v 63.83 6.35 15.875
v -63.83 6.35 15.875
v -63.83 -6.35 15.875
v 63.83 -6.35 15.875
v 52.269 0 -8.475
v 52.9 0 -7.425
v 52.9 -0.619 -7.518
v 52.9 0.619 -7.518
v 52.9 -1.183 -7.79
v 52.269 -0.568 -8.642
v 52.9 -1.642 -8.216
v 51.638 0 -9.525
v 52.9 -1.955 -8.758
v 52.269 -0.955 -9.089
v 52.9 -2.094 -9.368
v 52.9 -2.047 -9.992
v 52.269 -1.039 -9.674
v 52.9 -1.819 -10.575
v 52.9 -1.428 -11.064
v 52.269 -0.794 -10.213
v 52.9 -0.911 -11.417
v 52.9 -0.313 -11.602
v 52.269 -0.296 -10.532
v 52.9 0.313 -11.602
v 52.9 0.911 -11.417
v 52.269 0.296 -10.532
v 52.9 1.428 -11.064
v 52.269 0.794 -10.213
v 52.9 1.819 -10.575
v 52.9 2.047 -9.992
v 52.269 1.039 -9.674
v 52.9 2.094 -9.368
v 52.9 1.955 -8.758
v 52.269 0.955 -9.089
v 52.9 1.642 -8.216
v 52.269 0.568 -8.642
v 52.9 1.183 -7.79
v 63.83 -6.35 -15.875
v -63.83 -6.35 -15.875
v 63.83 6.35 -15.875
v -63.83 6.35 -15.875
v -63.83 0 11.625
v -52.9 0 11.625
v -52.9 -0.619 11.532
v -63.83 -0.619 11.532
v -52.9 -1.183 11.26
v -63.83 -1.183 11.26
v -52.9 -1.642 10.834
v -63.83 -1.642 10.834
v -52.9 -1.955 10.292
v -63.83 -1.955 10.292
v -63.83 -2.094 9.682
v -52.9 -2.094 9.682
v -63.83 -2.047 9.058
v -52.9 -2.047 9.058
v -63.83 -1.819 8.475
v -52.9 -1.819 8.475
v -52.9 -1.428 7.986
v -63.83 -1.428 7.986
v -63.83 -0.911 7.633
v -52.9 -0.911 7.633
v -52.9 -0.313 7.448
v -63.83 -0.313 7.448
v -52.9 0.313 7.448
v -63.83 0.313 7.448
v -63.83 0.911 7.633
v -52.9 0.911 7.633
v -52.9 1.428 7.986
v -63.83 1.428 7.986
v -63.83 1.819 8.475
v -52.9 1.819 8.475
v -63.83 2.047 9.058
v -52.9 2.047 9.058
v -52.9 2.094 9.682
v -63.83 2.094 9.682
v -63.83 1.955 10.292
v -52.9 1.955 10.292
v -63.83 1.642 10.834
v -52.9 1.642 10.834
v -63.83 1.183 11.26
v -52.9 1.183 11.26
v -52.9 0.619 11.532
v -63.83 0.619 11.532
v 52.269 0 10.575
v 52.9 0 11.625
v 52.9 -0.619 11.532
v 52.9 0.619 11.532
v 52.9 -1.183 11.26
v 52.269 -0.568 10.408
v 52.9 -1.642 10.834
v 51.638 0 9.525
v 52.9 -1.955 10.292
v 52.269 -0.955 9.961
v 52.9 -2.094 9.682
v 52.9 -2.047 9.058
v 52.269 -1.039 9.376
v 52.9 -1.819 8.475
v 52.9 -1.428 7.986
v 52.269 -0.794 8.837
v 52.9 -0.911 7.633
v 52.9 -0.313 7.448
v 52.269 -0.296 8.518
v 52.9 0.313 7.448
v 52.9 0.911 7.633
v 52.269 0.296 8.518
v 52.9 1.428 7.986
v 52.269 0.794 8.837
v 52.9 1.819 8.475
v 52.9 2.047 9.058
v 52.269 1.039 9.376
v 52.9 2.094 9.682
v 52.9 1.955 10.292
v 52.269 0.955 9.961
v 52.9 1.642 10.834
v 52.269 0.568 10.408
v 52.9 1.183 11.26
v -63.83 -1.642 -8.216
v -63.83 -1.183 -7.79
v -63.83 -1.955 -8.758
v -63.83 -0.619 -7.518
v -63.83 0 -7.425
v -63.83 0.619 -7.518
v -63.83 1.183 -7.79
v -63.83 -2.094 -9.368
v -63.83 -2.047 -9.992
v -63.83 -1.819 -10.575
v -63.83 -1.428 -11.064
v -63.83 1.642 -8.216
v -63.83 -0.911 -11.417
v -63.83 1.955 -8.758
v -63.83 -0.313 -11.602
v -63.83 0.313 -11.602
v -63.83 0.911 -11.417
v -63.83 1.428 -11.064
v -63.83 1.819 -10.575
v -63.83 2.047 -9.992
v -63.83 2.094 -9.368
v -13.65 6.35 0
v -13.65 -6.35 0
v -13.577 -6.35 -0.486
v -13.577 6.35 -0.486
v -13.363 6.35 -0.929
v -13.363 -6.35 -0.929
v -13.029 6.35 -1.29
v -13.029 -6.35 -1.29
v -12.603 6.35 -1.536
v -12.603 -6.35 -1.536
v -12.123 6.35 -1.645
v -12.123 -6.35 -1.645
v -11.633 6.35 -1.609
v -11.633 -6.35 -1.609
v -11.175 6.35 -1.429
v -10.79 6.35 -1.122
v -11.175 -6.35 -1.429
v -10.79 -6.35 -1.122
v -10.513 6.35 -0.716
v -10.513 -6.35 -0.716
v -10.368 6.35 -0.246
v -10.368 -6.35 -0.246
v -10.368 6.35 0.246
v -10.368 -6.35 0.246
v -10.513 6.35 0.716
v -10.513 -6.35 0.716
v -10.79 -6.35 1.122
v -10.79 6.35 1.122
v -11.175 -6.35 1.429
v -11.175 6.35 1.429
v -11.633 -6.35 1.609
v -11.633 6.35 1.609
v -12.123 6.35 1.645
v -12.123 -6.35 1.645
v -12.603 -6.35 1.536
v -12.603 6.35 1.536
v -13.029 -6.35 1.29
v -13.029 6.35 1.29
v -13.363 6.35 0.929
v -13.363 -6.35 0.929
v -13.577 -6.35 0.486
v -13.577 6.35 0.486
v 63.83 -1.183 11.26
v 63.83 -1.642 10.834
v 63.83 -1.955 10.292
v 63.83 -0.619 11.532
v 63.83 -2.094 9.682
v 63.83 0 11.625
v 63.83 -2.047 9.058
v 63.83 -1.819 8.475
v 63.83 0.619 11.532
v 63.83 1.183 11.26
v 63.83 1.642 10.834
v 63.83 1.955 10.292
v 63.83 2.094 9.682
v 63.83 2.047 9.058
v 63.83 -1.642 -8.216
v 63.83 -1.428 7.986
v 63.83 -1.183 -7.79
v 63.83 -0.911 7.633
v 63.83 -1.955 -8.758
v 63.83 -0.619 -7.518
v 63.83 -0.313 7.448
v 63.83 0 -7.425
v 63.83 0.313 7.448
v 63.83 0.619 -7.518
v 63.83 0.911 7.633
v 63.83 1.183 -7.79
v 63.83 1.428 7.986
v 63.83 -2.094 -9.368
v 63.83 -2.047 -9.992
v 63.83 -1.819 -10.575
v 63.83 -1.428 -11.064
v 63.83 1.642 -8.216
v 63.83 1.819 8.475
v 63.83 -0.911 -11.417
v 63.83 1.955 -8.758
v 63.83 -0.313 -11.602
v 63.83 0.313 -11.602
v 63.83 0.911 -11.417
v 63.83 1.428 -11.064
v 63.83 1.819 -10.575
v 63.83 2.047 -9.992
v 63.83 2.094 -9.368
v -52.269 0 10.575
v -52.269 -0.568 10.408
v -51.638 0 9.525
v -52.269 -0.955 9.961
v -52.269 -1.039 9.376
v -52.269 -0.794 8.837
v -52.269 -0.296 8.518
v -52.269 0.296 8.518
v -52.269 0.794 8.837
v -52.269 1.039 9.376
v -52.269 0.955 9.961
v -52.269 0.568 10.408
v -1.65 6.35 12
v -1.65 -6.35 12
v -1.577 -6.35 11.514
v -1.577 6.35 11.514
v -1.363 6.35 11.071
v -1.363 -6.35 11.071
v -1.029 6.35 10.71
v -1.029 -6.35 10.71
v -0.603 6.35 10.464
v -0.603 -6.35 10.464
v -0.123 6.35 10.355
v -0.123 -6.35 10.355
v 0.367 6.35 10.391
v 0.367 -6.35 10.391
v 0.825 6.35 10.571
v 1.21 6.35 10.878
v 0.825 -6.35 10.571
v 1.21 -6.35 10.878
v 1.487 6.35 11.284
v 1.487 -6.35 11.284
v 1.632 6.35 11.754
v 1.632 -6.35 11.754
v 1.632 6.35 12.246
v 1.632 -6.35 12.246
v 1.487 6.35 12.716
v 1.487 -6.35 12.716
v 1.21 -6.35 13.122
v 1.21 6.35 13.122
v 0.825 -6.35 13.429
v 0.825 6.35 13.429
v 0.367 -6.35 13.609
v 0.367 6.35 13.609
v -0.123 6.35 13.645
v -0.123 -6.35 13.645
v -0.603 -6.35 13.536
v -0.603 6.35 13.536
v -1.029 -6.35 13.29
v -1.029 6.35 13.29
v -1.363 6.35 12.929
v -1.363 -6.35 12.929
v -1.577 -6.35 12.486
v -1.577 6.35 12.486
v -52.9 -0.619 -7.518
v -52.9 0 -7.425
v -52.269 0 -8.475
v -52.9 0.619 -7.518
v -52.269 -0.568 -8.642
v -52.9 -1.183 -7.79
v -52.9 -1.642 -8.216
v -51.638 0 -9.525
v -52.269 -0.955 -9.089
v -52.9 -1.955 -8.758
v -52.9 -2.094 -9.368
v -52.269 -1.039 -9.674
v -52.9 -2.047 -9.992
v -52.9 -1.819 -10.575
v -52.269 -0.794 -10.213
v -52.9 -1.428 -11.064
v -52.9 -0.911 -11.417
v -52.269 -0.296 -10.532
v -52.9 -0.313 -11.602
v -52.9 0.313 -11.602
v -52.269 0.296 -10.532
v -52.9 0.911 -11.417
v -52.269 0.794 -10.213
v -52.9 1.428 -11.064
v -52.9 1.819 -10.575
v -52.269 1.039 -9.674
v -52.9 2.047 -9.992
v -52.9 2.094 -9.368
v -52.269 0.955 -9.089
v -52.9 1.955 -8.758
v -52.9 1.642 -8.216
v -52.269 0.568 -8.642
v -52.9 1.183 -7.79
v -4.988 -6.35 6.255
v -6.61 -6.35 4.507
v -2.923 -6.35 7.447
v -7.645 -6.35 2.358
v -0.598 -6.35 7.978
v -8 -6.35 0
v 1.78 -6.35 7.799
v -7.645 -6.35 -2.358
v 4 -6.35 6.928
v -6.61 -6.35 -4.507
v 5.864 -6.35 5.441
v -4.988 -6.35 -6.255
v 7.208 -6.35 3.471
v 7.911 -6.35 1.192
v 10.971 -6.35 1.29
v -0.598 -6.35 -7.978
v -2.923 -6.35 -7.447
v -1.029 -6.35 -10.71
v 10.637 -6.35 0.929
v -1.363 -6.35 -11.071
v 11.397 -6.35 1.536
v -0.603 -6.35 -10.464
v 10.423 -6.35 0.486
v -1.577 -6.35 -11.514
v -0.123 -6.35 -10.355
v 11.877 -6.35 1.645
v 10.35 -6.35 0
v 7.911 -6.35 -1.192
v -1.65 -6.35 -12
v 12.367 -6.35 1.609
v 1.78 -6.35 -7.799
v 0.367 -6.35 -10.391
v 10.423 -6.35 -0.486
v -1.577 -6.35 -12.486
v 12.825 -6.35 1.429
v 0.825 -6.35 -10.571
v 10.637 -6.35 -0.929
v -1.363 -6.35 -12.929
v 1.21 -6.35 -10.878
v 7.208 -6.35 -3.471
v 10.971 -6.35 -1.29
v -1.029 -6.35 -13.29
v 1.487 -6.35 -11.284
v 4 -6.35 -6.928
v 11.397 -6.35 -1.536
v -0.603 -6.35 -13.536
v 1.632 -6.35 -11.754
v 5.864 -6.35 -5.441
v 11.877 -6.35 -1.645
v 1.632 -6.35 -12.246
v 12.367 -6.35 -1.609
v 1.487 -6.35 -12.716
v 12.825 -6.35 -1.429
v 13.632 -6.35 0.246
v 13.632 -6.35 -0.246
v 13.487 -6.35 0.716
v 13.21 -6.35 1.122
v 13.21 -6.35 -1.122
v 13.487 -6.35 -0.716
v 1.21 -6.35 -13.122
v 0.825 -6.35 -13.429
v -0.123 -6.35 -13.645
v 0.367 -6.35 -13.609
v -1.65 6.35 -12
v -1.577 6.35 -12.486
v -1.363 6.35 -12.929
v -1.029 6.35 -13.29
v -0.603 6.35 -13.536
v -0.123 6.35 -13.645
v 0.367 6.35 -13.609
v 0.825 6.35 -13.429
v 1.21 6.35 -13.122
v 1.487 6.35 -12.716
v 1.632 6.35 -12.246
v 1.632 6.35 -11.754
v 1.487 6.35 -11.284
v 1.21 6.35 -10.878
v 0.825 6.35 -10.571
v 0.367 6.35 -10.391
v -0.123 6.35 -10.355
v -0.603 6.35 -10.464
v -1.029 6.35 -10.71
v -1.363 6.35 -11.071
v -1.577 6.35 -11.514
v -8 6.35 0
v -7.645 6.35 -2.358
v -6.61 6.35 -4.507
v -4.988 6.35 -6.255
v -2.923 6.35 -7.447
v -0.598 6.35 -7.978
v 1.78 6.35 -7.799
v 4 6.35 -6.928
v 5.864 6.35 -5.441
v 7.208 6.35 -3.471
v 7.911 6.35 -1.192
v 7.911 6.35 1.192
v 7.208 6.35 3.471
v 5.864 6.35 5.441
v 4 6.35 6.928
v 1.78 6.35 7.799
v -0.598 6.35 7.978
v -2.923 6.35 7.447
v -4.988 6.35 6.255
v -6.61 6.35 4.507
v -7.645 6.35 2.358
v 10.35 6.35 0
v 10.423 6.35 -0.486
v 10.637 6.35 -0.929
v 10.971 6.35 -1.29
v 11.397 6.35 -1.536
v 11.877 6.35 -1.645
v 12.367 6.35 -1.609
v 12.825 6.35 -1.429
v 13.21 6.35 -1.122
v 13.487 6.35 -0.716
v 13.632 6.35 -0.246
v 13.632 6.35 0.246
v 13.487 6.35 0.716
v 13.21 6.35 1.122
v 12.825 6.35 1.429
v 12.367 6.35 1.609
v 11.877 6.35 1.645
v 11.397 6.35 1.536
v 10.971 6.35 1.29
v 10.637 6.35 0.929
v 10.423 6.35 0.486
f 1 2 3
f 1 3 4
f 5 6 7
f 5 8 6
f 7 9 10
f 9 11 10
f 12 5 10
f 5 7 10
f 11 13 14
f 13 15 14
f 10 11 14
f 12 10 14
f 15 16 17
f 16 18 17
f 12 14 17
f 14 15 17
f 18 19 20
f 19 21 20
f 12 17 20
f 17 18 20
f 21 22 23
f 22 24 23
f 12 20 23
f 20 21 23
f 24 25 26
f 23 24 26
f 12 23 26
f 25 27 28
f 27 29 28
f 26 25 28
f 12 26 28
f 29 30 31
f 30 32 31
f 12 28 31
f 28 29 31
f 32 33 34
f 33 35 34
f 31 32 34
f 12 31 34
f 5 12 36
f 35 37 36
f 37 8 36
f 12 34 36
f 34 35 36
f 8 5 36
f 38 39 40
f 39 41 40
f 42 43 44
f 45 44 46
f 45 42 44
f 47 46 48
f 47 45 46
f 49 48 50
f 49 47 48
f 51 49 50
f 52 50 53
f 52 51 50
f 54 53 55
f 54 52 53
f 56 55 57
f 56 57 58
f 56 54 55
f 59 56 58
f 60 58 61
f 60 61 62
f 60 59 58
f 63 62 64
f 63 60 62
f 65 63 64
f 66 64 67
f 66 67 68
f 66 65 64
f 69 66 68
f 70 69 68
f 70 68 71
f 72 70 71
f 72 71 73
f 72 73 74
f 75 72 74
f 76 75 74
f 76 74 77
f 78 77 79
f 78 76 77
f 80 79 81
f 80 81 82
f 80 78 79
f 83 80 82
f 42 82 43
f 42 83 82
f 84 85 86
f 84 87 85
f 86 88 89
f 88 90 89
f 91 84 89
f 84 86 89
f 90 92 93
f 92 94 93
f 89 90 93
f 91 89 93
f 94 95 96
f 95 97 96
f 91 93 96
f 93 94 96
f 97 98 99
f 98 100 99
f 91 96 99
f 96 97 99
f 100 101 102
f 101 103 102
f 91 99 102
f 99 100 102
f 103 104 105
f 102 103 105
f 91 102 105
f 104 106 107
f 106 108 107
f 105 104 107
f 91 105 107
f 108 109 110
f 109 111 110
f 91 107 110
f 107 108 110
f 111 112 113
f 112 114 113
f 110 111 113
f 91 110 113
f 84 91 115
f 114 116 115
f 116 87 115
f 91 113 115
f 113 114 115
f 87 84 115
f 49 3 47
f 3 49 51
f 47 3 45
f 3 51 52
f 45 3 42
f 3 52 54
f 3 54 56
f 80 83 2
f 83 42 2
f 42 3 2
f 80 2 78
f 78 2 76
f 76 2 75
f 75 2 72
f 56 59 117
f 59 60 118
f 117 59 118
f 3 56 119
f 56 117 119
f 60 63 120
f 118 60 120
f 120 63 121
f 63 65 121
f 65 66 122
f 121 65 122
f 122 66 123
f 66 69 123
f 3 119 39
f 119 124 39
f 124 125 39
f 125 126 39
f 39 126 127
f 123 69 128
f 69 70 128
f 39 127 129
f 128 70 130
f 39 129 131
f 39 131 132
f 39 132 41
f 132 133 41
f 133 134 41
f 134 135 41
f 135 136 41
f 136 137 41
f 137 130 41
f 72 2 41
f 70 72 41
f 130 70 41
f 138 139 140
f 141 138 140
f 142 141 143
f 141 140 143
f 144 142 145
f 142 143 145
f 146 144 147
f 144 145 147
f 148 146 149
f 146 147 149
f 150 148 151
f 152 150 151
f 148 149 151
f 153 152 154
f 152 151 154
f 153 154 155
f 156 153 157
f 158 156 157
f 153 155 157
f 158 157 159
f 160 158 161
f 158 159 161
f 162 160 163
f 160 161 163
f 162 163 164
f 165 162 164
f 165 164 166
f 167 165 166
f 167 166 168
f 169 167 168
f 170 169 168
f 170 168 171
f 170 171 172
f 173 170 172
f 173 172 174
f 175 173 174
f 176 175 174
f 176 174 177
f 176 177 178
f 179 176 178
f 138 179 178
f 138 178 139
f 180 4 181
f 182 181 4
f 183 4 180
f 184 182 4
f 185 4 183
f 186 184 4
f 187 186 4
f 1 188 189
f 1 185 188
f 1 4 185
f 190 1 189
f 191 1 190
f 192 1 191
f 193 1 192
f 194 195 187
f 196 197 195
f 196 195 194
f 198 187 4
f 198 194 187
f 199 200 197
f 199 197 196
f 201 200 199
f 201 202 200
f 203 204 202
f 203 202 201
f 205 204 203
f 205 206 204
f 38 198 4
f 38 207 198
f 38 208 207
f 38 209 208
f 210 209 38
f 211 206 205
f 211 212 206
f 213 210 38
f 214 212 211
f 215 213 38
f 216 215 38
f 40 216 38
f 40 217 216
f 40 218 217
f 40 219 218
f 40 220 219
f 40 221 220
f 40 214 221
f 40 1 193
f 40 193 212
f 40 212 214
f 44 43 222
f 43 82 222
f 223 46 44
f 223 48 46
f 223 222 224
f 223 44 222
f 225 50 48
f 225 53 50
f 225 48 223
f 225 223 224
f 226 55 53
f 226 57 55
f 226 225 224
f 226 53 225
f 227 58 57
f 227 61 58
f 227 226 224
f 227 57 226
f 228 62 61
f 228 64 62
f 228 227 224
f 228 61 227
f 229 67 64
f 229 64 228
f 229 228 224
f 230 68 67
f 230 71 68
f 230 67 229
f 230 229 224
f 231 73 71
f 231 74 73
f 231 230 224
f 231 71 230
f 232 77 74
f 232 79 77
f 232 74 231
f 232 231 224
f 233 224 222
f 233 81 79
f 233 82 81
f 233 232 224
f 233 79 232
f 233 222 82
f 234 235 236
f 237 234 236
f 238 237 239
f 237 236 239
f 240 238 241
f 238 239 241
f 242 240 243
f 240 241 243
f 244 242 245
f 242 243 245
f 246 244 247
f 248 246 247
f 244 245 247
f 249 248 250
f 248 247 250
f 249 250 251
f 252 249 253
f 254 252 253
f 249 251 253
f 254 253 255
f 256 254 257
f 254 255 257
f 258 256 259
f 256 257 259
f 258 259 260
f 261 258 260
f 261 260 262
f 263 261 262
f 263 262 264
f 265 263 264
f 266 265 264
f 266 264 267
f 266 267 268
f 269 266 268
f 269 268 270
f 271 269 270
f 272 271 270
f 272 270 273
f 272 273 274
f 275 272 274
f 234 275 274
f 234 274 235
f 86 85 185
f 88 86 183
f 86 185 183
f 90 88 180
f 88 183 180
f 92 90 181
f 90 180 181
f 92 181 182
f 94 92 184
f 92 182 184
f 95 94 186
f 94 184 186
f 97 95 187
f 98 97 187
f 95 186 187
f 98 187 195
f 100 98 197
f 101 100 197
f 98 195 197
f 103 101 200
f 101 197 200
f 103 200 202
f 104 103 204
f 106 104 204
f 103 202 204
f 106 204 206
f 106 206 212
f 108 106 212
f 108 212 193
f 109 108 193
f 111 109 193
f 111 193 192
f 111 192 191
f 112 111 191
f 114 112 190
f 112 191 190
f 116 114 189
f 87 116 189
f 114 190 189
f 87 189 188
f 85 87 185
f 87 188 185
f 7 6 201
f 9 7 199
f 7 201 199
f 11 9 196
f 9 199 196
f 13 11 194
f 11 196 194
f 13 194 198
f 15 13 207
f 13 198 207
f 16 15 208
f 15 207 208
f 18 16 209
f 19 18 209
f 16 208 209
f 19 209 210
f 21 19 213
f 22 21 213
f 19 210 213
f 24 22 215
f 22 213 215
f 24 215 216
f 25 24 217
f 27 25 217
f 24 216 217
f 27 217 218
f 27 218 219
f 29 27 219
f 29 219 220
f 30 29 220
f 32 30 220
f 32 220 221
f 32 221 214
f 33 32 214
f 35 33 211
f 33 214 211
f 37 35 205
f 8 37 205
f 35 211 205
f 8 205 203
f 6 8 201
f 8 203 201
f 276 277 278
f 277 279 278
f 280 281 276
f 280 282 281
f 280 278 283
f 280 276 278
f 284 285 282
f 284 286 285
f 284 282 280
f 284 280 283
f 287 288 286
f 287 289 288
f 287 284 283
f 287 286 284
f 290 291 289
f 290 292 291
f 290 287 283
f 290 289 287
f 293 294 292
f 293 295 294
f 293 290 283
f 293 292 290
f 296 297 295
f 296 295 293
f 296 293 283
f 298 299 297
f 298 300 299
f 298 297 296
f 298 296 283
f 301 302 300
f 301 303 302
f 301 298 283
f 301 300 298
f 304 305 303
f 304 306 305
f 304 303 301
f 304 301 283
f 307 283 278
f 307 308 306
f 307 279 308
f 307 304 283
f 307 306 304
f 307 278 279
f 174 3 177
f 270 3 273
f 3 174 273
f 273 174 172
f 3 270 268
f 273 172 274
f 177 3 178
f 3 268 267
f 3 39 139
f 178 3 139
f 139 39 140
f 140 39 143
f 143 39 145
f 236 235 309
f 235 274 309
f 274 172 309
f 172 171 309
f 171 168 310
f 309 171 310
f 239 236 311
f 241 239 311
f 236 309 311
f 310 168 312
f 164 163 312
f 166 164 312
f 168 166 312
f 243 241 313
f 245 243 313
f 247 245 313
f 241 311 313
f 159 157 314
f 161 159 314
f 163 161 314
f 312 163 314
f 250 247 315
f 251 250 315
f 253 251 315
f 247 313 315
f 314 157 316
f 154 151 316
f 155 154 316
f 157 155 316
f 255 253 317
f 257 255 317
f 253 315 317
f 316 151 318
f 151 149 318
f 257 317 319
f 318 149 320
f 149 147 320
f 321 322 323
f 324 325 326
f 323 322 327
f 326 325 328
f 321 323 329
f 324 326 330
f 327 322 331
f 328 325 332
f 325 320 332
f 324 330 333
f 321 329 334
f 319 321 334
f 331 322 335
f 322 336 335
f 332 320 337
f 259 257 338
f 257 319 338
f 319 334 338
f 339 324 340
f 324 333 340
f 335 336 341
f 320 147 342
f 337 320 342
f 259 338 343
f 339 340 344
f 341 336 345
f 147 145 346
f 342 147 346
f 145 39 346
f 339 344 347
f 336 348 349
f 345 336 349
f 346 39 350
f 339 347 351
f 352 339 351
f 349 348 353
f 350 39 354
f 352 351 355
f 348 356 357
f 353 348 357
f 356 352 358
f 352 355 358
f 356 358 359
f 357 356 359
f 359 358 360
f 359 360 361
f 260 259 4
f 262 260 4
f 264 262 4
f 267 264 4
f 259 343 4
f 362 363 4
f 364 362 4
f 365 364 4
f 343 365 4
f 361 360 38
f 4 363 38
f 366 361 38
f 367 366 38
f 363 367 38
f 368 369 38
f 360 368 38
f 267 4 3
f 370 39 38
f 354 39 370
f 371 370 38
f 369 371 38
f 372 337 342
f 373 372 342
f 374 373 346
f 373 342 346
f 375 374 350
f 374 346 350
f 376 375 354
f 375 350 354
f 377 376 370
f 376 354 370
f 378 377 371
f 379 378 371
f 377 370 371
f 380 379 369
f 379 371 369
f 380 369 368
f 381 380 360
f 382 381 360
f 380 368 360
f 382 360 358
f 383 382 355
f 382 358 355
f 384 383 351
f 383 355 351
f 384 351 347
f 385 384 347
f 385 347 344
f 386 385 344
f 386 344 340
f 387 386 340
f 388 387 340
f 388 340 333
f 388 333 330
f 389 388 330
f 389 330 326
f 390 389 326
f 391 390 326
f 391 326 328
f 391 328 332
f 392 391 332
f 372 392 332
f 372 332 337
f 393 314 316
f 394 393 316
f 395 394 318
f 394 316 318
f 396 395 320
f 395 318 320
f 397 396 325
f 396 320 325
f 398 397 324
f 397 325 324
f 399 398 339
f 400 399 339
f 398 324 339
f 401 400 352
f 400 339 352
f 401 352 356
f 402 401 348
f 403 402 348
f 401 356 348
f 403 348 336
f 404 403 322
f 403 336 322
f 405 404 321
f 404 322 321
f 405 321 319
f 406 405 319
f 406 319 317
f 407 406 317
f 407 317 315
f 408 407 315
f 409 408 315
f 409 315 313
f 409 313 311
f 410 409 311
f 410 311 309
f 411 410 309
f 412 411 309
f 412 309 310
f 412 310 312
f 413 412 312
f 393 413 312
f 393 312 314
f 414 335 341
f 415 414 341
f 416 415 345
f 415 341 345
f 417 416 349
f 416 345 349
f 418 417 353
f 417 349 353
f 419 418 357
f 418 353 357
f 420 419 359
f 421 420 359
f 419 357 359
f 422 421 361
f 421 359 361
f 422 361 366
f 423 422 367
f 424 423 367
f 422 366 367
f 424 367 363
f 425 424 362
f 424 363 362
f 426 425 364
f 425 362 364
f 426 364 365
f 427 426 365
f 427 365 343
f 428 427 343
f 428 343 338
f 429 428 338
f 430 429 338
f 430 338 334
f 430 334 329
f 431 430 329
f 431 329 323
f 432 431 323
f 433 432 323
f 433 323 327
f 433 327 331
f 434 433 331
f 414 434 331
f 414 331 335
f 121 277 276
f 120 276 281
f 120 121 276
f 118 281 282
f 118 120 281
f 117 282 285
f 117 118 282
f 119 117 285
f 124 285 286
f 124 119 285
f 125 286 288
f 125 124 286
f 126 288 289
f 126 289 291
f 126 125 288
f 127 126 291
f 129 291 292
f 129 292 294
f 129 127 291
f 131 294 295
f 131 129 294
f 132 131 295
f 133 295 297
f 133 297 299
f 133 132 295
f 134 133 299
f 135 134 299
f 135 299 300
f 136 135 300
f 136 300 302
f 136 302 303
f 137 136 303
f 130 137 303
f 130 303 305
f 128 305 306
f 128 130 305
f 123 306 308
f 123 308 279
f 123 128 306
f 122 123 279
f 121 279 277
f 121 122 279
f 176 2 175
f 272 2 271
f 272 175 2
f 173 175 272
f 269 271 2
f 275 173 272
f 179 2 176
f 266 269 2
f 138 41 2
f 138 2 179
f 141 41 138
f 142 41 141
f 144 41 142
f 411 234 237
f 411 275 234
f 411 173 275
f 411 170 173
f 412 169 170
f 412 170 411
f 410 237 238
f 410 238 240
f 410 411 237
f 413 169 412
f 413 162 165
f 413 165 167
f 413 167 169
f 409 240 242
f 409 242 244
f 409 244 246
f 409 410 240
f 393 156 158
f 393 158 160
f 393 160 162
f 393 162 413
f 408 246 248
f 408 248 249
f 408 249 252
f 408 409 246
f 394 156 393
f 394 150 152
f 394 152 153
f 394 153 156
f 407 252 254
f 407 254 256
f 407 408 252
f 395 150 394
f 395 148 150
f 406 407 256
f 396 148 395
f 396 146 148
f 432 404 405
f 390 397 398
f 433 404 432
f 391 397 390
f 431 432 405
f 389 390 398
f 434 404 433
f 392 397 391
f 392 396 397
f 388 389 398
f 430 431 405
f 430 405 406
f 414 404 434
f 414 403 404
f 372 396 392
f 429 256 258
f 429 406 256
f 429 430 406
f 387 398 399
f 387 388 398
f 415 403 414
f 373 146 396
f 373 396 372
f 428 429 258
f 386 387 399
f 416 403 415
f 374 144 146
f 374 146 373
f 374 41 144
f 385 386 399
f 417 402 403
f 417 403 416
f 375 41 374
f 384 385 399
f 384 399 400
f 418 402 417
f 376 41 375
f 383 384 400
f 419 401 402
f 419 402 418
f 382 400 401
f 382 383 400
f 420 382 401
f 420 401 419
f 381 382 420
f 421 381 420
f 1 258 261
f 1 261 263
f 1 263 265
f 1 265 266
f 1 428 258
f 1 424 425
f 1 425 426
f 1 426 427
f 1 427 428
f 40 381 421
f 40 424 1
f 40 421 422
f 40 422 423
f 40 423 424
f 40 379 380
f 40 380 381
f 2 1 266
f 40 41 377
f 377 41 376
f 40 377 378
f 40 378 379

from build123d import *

# Parameters (mm, degrees)
SKETCH1_W                      = 127.660000204
SKETCH1_H                      = 31.75
BOSS_EXTRUDE1_DEPTH            = 6.35
M5X0_8_TAPPED_HOLE1_AT_2_COUNT = 2
M5X0_8_TAPPED_HOLE1_AT_2_PITCH = 19.05
F_16_0MM_DOWEL_HOLE1_D         = 16
TAP_DRILL_FOR_M4X0_7_TAP1_D    = 3.3


with BuildPart() as part:
    # Sketch1 → Boss-Extrude1 (new, symmetric)
    with BuildSketch(Plane(origin=(0, 0, 0), x_dir=(1, 0, 0), z_dir=(0, 1, 0))):
        Rectangle(SKETCH1_W, SKETCH1_H)
    extrude(amount=BOSS_EXTRUDE1_DEPTH, both=True)

    # Sketch4 → M5x0.8 Tapped Hole1 (revolve, cut)
    with BuildSketch(Plane(origin=(-63.830000102, 0, 9.525), x_dir=(0, 0, 1), z_dir=(0, 1, 0))):
        Polygon((0, 0), (0, 12.192), (2.1, 10.9301927), (2.1, 0), align=None)
    m5x0_8_tapped_hole1 = revolve(axis=Axis((-70.180000102, 0, 9.525), (1, 0, 0)), mode=Mode.SUBTRACT)

    # M5x0.8 Tapped Hole1 at 2: M5x0.8 Tapped Hole1 ×2
    with Locations(*[(0, 0, -i * M5X0_8_TAPPED_HOLE1_AT_2_PITCH) for i in range(1, M5X0_8_TAPPED_HOLE1_AT_2_COUNT)]):
        add(m5x0_8_tapped_hole1, mode=Mode.SUBTRACT)

    # Mirror1: M5x0.8 Tapped Hole1 across plane
    add(m5x0_8_tapped_hole1.mirror(Plane(origin=(0, 0, 0), x_dir=(0, 0, 1), z_dir=(1, 0, 0))), mode=Mode.SUBTRACT)

    # Mirror1 copy 1 sketch → Mirror1 copy 1 (revolve, cut)
    with BuildSketch(Plane(origin=(63.830000102, 0, -9.525), x_dir=(0, 0, 1), z_dir=(0, 1, 0))):
        Polygon((0, 0), (0, -12.192), (2.1, -10.9301927), (2.1, 0), align=None)
    revolve(axis=Axis((70.180000102, 0, -9.525), (1, 0, 0)), mode=Mode.SUBTRACT)

    # Ø16.0mm Dowel Hole1 (through all)
    with Locations(Plane(origin=(0, 6.35, 0), x_dir=(1, 0, 0), z_dir=(0, 1, 0))):
        with Locations((0, 0)):
            Hole(F_16_0MM_DOWEL_HOLE1_D / 2)

    # Tap Drill for M4x0.7 Tap1 (through all)
    with Locations(Plane(origin=(0, 6.35, 0), x_dir=(1, 0, 0), z_dir=(0, 1, 0))):
        with Locations((0, 12), (12, 0), (-12, 0), (0, -12)):
            Hole(TAP_DRILL_FOR_M4X0_7_TAP1_D / 2)


solid = part.part
